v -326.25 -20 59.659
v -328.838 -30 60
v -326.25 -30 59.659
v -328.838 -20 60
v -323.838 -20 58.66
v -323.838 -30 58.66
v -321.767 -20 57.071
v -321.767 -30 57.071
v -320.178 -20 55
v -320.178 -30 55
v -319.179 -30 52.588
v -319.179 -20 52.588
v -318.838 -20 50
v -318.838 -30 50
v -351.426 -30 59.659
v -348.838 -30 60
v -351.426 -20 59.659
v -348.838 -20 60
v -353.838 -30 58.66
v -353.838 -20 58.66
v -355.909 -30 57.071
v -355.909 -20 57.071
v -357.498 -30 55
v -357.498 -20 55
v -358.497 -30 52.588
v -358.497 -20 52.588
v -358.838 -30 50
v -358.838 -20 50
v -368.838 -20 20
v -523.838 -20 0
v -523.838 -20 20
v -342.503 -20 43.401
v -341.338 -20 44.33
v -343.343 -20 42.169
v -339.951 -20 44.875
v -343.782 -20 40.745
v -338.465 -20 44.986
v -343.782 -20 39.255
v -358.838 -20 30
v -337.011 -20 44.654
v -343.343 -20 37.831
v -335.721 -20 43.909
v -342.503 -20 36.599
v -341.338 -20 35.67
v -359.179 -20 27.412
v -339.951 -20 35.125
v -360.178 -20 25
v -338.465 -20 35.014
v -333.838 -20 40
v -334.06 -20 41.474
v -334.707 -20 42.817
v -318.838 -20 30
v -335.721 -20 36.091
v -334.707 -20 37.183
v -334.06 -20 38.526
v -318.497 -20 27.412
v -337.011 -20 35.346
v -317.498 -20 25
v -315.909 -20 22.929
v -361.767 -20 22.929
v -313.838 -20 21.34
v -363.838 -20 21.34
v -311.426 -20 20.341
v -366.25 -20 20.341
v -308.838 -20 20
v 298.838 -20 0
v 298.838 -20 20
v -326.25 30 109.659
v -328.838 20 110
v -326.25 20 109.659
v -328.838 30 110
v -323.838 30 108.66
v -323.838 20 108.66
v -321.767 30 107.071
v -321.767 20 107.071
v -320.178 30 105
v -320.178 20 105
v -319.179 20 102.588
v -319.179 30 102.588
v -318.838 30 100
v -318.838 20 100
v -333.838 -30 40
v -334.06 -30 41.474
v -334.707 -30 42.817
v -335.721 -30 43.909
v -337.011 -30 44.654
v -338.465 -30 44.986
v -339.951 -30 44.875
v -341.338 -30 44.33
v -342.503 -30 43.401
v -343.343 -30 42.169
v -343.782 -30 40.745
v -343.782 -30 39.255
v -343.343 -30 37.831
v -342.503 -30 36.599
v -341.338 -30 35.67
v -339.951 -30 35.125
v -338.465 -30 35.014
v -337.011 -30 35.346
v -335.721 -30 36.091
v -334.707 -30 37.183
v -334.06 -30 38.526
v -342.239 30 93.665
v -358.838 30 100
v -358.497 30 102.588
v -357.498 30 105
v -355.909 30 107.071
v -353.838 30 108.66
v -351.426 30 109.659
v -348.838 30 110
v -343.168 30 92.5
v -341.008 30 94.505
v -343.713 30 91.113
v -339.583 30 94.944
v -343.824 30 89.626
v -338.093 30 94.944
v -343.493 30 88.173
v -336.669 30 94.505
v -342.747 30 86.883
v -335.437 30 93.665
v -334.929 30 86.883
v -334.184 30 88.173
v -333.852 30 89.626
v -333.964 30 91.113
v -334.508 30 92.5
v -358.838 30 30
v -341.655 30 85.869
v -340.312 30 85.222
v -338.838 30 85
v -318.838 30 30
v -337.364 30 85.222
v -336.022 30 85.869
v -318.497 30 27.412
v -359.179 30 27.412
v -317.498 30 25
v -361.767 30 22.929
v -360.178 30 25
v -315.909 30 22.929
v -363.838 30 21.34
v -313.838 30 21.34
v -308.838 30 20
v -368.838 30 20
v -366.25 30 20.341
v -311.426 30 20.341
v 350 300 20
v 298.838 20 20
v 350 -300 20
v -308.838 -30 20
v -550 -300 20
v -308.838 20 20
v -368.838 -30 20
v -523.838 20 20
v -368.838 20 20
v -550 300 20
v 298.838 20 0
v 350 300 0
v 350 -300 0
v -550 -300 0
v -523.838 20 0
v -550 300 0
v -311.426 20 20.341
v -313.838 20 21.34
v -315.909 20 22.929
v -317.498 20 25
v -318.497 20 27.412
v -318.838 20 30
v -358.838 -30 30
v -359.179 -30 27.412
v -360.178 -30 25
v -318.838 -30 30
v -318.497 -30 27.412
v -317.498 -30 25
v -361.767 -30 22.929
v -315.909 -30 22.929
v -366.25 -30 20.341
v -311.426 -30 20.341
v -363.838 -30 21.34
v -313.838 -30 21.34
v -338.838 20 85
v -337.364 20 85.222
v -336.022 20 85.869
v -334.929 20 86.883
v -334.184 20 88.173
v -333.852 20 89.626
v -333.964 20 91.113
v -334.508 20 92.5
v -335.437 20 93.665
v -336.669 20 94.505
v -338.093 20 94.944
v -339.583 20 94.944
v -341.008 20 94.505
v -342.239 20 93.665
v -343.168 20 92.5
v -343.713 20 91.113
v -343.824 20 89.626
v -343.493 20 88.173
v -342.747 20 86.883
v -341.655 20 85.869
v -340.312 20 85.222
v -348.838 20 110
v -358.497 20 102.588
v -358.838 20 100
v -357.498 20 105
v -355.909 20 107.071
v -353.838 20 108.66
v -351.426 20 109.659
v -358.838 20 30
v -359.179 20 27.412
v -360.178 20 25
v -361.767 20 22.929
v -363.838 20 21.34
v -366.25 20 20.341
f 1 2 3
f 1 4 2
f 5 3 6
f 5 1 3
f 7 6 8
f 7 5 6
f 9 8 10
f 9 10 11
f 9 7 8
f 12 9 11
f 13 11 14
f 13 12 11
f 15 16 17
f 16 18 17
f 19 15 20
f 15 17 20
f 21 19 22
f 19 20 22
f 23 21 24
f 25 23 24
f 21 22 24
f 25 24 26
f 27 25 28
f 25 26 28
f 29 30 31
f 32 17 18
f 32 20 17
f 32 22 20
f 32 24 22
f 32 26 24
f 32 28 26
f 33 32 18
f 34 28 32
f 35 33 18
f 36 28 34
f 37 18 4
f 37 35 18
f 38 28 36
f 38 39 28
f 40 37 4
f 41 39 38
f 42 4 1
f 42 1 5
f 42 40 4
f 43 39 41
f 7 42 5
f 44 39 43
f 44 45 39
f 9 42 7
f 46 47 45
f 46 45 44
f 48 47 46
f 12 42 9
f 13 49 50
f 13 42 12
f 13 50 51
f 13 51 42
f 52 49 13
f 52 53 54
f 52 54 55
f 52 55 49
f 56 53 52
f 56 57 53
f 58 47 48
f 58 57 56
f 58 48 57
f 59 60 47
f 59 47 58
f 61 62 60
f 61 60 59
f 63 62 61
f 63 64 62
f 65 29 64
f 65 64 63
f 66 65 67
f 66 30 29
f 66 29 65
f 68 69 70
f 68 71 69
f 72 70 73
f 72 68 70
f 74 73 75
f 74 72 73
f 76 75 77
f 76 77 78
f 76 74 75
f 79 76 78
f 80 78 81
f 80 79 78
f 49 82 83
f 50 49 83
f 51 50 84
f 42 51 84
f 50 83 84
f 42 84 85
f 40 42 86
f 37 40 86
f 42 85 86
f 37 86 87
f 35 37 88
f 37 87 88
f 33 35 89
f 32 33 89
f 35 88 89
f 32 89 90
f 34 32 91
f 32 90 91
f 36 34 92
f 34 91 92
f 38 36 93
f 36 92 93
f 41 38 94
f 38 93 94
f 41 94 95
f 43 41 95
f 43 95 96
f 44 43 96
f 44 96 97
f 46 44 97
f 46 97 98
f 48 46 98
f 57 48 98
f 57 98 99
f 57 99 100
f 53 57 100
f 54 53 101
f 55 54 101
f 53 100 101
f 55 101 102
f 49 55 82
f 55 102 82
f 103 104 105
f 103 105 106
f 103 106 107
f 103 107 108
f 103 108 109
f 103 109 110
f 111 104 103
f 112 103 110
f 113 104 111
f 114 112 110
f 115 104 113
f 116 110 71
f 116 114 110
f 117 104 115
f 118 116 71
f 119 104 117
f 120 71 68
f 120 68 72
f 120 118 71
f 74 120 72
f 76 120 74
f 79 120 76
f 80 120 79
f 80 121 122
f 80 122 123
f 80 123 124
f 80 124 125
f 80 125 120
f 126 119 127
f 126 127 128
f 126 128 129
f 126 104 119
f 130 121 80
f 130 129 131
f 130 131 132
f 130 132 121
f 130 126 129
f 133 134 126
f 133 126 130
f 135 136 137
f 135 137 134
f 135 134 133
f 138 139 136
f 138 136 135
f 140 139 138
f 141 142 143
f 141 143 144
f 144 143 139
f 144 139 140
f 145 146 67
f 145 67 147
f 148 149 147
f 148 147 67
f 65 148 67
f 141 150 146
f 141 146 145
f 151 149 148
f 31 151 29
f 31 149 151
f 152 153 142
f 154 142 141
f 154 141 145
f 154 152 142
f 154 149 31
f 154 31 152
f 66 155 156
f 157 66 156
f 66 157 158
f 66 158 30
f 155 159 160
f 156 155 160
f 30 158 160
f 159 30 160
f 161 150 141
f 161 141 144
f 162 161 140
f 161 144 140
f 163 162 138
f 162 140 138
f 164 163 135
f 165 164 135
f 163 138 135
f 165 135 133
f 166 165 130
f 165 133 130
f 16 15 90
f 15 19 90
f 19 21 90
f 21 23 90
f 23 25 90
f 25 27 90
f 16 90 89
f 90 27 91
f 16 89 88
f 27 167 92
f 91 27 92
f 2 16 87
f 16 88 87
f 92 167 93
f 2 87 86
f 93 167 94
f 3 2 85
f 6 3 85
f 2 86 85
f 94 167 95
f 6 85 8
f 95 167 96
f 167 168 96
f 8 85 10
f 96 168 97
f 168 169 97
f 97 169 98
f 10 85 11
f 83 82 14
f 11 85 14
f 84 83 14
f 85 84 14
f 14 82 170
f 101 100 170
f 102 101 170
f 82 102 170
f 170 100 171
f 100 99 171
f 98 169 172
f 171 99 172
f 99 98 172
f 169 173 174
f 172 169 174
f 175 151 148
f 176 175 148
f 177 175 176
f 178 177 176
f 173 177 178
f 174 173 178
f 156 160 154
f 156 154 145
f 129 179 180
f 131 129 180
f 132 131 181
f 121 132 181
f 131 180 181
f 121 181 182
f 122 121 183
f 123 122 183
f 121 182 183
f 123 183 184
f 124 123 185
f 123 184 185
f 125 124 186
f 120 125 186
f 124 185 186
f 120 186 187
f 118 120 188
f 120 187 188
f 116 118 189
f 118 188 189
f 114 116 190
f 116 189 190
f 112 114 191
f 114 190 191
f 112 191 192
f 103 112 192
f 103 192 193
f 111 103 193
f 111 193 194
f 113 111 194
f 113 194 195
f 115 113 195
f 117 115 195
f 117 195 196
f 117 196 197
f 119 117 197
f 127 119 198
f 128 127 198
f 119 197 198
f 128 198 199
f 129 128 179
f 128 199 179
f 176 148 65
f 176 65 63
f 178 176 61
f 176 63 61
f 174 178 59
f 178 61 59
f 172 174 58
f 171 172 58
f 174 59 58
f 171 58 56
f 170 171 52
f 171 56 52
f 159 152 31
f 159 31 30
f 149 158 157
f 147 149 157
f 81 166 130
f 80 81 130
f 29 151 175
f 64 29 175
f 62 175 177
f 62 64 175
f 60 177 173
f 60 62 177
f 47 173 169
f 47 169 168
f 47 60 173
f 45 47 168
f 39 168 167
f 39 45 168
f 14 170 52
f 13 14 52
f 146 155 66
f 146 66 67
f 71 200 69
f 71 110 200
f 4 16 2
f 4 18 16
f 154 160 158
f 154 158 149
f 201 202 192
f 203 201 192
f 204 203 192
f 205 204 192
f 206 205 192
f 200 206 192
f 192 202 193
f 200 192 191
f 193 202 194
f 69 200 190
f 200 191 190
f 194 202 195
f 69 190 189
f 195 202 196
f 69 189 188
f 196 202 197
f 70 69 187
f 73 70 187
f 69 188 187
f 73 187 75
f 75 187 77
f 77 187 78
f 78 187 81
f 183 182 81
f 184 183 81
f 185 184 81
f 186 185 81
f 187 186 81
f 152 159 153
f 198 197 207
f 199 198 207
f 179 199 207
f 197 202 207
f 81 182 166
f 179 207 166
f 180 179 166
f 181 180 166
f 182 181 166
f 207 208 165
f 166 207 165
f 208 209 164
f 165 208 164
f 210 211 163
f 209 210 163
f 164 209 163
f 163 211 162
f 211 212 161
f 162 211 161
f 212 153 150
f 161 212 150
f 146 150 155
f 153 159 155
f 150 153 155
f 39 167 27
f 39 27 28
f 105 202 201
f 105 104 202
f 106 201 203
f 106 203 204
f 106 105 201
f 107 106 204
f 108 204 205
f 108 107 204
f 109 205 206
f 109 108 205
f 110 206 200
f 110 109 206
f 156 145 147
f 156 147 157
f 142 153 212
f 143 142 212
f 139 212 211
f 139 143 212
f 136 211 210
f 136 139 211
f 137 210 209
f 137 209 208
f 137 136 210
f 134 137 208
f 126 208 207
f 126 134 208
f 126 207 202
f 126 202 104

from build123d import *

# Parameters (mm, degrees)
SKETCH1_W           = 1300
SKETCH1_H           = 600
SKETCH1_W_2         = 1117.676372874
SKETCH1_H_2         = 40
BOSS_EXTRUDE1_DEPTH = 20
SKETCH2_W           = 40
SKETCH2_H           = 10
BOSS_EXTRUDE2_DEPTH = 40
SKETCH3_R           = 5
CUT_EXTRUDE1_DEPTH  = 10
SKETCH4_W           = 40
SKETCH4_H           = 10
BOSS_EXTRUDE3_DEPTH = 50
SKETCH5_R           = 5
CUT_EXTRUDE2_DEPTH  = 10
FILLET1_R           = 10
FILLET2_R           = 10
FILLET3_R           = 10
FILLET4_R           = 10
FILLET5_R           = 10
FILLET6_R           = 10
FILLET7_R           = 10
FILLET8_R           = 10
SKETCH6_W           = 20
SKETCH6_H           = 40
BOSS_EXTRUDE4_DEPTH = 260
SKETCH7_W           = 20
SKETCH7_H           = 40
BOSS_EXTRUDE5_DEPTH = 35
SKETCH8_W           = 20
SKETCH8_H           = 600
CUT_EXTRUDE3_DEPTH  = 100
SKETCH9_W           = 20
SKETCH9_H           = 600
CUT_EXTRUDE4_DEPTH  = 300


with BuildPart() as part:
    # Sketch1 → Boss-Extrude1 (new body)
    with BuildSketch(Plane.XY):
        Rectangle(SKETCH1_W, SKETCH1_H)
        Rectangle(SKETCH1_W_2, SKETCH1_H_2, mode=Mode.SUBTRACT)
    extrude(amount=BOSS_EXTRUDE1_DEPTH)

    # Sketch2 → Boss-Extrude2 (add)
    with BuildSketch(Plane.XY.offset(20)):
        with Locations((-338.838186437, 25)):
            Rectangle(SKETCH2_W, SKETCH2_H)
        with Locations((-338.838186437, -25)):
            Rectangle(SKETCH2_W, SKETCH2_H)
    extrude(amount=BOSS_EXTRUDE2_DEPTH)

    # Sketch3 → Cut-Extrude1 (cut)
    with BuildSketch(Plane.XZ.offset(30)):
        with Locations((-338.838186437, 40)):
            Circle(SKETCH3_R)
    extrude(amount=-CUT_EXTRUDE1_DEPTH, mode=Mode.SUBTRACT)

    # Sketch4 → Boss-Extrude3 (add)
    with BuildSketch(Plane.XY.offset(60)):
        with Locations((-338.838186437, 25)):
            Rectangle(SKETCH4_W, SKETCH4_H)
    extrude(amount=BOSS_EXTRUDE3_DEPTH)

    # Sketch5 → Cut-Extrude2 (cut)
    with BuildSketch(Plane.XZ.offset(-20)):
        with Locations(Location((-338.838186437, 90, 0), (0, 0, 270))):
            Circle(SKETCH5_R)
    extrude(amount=-CUT_EXTRUDE2_DEPTH, mode=Mode.SUBTRACT)

    # Fillet1
    fillet1_edges = [part.edges().sort_by_distance(p)[0] for p in [
        (-318.838186437, -25, 20),
    ]]
    fillet(fillet1_edges, radius=FILLET1_R)

    # Fillet2
    fillet2_edges = [part.edges().sort_by_distance(p)[0] for p in [
        (-318.838186437, 25, 20),
    ]]
    fillet(fillet2_edges, radius=FILLET2_R)

    # Fillet3
    fillet3_edges = [part.edges().sort_by_distance(p)[0] for p in [
        (-358.838186437, -25, 20),
    ]]
    fillet(fillet3_edges, radius=FILLET3_R)

    # Fillet4
    fillet4_edges = [part.edges().sort_by_distance(p)[0] for p in [
        (-358.838186437, 25, 20),
    ]]
    fillet(fillet4_edges, radius=FILLET4_R)

    # Fillet5
    fillet5_edges = [part.edges().sort_by_distance(p)[0] for p in [
        (-318.838186437, -25, 60),
    ]]
    fillet(fillet5_edges, radius=FILLET5_R)

    # Fillet6
    fillet6_edges = [part.edges().sort_by_distance(p)[0] for p in [
        (-358.838186437, -25, 60),
    ]]
    fillet(fillet6_edges, radius=FILLET6_R)

    # Fillet7
    fillet7_edges = [part.edges().sort_by_distance(p)[0] for p in [
        (-358.838186437, 25, 110),
    ]]
    fillet(fillet7_edges, radius=FILLET7_R)

    # Fillet8
    fillet8_edges = [part.edges().sort_by_distance(p)[0] for p in [
        (-318.838186437, 25, 110),
    ]]
    fillet(fillet8_edges, radius=FILLET8_R)

    # Sketch6 → Boss-Extrude4 (add)
    with BuildSketch(Plane.ZY.offset(-558.838186437)):
        with Locations((10, 0)):
            Rectangle(SKETCH6_W, SKETCH6_H)
    extrude(amount=BOSS_EXTRUDE4_DEPTH)

    # Sketch7 → Boss-Extrude5 (add)
    with BuildSketch(Plane(origin=(-558.838186437, 0, 0), x_dir=(0, 0, -1), z_dir=(1, 0, 0))):
        with Locations((-10, 0)):
            Rectangle(SKETCH7_W, SKETCH7_H)
    extrude(amount=BOSS_EXTRUDE5_DEPTH)

    # Sketch8 → Cut-Extrude3 (cut)
    with BuildSketch(Plane.ZY.offset(650)):
        with Locations((10, 0)):
            Rectangle(SKETCH8_W, SKETCH8_H)
    extrude(amount=-CUT_EXTRUDE3_DEPTH, mode=Mode.SUBTRACT)

    # Sketch9 → Cut-Extrude4 (cut)
    with BuildSketch(Plane(origin=(650, 0, 0), x_dir=(0, 0, -1), z_dir=(1, 0, 0))):
        with Locations((-10, 0)):
            Rectangle(SKETCH9_W, SKETCH9_H)
    extrude(amount=-CUT_EXTRUDE4_DEPTH, mode=Mode.SUBTRACT)


solid = part.part
